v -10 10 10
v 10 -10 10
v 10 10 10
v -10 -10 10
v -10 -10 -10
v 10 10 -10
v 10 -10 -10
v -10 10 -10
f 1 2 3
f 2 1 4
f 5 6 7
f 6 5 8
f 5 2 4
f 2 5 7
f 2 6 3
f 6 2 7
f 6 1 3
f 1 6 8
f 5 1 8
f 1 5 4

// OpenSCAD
// Generated by CadMonkey
// Prompt: hey cadmonkey, create me a cube
// Generated at: 2025-11-11 05:49:30

// Simple cube model
// Dimensions: 20 mm × 20 mm × 20 mm

cube([20, 20, 20], center = true);
